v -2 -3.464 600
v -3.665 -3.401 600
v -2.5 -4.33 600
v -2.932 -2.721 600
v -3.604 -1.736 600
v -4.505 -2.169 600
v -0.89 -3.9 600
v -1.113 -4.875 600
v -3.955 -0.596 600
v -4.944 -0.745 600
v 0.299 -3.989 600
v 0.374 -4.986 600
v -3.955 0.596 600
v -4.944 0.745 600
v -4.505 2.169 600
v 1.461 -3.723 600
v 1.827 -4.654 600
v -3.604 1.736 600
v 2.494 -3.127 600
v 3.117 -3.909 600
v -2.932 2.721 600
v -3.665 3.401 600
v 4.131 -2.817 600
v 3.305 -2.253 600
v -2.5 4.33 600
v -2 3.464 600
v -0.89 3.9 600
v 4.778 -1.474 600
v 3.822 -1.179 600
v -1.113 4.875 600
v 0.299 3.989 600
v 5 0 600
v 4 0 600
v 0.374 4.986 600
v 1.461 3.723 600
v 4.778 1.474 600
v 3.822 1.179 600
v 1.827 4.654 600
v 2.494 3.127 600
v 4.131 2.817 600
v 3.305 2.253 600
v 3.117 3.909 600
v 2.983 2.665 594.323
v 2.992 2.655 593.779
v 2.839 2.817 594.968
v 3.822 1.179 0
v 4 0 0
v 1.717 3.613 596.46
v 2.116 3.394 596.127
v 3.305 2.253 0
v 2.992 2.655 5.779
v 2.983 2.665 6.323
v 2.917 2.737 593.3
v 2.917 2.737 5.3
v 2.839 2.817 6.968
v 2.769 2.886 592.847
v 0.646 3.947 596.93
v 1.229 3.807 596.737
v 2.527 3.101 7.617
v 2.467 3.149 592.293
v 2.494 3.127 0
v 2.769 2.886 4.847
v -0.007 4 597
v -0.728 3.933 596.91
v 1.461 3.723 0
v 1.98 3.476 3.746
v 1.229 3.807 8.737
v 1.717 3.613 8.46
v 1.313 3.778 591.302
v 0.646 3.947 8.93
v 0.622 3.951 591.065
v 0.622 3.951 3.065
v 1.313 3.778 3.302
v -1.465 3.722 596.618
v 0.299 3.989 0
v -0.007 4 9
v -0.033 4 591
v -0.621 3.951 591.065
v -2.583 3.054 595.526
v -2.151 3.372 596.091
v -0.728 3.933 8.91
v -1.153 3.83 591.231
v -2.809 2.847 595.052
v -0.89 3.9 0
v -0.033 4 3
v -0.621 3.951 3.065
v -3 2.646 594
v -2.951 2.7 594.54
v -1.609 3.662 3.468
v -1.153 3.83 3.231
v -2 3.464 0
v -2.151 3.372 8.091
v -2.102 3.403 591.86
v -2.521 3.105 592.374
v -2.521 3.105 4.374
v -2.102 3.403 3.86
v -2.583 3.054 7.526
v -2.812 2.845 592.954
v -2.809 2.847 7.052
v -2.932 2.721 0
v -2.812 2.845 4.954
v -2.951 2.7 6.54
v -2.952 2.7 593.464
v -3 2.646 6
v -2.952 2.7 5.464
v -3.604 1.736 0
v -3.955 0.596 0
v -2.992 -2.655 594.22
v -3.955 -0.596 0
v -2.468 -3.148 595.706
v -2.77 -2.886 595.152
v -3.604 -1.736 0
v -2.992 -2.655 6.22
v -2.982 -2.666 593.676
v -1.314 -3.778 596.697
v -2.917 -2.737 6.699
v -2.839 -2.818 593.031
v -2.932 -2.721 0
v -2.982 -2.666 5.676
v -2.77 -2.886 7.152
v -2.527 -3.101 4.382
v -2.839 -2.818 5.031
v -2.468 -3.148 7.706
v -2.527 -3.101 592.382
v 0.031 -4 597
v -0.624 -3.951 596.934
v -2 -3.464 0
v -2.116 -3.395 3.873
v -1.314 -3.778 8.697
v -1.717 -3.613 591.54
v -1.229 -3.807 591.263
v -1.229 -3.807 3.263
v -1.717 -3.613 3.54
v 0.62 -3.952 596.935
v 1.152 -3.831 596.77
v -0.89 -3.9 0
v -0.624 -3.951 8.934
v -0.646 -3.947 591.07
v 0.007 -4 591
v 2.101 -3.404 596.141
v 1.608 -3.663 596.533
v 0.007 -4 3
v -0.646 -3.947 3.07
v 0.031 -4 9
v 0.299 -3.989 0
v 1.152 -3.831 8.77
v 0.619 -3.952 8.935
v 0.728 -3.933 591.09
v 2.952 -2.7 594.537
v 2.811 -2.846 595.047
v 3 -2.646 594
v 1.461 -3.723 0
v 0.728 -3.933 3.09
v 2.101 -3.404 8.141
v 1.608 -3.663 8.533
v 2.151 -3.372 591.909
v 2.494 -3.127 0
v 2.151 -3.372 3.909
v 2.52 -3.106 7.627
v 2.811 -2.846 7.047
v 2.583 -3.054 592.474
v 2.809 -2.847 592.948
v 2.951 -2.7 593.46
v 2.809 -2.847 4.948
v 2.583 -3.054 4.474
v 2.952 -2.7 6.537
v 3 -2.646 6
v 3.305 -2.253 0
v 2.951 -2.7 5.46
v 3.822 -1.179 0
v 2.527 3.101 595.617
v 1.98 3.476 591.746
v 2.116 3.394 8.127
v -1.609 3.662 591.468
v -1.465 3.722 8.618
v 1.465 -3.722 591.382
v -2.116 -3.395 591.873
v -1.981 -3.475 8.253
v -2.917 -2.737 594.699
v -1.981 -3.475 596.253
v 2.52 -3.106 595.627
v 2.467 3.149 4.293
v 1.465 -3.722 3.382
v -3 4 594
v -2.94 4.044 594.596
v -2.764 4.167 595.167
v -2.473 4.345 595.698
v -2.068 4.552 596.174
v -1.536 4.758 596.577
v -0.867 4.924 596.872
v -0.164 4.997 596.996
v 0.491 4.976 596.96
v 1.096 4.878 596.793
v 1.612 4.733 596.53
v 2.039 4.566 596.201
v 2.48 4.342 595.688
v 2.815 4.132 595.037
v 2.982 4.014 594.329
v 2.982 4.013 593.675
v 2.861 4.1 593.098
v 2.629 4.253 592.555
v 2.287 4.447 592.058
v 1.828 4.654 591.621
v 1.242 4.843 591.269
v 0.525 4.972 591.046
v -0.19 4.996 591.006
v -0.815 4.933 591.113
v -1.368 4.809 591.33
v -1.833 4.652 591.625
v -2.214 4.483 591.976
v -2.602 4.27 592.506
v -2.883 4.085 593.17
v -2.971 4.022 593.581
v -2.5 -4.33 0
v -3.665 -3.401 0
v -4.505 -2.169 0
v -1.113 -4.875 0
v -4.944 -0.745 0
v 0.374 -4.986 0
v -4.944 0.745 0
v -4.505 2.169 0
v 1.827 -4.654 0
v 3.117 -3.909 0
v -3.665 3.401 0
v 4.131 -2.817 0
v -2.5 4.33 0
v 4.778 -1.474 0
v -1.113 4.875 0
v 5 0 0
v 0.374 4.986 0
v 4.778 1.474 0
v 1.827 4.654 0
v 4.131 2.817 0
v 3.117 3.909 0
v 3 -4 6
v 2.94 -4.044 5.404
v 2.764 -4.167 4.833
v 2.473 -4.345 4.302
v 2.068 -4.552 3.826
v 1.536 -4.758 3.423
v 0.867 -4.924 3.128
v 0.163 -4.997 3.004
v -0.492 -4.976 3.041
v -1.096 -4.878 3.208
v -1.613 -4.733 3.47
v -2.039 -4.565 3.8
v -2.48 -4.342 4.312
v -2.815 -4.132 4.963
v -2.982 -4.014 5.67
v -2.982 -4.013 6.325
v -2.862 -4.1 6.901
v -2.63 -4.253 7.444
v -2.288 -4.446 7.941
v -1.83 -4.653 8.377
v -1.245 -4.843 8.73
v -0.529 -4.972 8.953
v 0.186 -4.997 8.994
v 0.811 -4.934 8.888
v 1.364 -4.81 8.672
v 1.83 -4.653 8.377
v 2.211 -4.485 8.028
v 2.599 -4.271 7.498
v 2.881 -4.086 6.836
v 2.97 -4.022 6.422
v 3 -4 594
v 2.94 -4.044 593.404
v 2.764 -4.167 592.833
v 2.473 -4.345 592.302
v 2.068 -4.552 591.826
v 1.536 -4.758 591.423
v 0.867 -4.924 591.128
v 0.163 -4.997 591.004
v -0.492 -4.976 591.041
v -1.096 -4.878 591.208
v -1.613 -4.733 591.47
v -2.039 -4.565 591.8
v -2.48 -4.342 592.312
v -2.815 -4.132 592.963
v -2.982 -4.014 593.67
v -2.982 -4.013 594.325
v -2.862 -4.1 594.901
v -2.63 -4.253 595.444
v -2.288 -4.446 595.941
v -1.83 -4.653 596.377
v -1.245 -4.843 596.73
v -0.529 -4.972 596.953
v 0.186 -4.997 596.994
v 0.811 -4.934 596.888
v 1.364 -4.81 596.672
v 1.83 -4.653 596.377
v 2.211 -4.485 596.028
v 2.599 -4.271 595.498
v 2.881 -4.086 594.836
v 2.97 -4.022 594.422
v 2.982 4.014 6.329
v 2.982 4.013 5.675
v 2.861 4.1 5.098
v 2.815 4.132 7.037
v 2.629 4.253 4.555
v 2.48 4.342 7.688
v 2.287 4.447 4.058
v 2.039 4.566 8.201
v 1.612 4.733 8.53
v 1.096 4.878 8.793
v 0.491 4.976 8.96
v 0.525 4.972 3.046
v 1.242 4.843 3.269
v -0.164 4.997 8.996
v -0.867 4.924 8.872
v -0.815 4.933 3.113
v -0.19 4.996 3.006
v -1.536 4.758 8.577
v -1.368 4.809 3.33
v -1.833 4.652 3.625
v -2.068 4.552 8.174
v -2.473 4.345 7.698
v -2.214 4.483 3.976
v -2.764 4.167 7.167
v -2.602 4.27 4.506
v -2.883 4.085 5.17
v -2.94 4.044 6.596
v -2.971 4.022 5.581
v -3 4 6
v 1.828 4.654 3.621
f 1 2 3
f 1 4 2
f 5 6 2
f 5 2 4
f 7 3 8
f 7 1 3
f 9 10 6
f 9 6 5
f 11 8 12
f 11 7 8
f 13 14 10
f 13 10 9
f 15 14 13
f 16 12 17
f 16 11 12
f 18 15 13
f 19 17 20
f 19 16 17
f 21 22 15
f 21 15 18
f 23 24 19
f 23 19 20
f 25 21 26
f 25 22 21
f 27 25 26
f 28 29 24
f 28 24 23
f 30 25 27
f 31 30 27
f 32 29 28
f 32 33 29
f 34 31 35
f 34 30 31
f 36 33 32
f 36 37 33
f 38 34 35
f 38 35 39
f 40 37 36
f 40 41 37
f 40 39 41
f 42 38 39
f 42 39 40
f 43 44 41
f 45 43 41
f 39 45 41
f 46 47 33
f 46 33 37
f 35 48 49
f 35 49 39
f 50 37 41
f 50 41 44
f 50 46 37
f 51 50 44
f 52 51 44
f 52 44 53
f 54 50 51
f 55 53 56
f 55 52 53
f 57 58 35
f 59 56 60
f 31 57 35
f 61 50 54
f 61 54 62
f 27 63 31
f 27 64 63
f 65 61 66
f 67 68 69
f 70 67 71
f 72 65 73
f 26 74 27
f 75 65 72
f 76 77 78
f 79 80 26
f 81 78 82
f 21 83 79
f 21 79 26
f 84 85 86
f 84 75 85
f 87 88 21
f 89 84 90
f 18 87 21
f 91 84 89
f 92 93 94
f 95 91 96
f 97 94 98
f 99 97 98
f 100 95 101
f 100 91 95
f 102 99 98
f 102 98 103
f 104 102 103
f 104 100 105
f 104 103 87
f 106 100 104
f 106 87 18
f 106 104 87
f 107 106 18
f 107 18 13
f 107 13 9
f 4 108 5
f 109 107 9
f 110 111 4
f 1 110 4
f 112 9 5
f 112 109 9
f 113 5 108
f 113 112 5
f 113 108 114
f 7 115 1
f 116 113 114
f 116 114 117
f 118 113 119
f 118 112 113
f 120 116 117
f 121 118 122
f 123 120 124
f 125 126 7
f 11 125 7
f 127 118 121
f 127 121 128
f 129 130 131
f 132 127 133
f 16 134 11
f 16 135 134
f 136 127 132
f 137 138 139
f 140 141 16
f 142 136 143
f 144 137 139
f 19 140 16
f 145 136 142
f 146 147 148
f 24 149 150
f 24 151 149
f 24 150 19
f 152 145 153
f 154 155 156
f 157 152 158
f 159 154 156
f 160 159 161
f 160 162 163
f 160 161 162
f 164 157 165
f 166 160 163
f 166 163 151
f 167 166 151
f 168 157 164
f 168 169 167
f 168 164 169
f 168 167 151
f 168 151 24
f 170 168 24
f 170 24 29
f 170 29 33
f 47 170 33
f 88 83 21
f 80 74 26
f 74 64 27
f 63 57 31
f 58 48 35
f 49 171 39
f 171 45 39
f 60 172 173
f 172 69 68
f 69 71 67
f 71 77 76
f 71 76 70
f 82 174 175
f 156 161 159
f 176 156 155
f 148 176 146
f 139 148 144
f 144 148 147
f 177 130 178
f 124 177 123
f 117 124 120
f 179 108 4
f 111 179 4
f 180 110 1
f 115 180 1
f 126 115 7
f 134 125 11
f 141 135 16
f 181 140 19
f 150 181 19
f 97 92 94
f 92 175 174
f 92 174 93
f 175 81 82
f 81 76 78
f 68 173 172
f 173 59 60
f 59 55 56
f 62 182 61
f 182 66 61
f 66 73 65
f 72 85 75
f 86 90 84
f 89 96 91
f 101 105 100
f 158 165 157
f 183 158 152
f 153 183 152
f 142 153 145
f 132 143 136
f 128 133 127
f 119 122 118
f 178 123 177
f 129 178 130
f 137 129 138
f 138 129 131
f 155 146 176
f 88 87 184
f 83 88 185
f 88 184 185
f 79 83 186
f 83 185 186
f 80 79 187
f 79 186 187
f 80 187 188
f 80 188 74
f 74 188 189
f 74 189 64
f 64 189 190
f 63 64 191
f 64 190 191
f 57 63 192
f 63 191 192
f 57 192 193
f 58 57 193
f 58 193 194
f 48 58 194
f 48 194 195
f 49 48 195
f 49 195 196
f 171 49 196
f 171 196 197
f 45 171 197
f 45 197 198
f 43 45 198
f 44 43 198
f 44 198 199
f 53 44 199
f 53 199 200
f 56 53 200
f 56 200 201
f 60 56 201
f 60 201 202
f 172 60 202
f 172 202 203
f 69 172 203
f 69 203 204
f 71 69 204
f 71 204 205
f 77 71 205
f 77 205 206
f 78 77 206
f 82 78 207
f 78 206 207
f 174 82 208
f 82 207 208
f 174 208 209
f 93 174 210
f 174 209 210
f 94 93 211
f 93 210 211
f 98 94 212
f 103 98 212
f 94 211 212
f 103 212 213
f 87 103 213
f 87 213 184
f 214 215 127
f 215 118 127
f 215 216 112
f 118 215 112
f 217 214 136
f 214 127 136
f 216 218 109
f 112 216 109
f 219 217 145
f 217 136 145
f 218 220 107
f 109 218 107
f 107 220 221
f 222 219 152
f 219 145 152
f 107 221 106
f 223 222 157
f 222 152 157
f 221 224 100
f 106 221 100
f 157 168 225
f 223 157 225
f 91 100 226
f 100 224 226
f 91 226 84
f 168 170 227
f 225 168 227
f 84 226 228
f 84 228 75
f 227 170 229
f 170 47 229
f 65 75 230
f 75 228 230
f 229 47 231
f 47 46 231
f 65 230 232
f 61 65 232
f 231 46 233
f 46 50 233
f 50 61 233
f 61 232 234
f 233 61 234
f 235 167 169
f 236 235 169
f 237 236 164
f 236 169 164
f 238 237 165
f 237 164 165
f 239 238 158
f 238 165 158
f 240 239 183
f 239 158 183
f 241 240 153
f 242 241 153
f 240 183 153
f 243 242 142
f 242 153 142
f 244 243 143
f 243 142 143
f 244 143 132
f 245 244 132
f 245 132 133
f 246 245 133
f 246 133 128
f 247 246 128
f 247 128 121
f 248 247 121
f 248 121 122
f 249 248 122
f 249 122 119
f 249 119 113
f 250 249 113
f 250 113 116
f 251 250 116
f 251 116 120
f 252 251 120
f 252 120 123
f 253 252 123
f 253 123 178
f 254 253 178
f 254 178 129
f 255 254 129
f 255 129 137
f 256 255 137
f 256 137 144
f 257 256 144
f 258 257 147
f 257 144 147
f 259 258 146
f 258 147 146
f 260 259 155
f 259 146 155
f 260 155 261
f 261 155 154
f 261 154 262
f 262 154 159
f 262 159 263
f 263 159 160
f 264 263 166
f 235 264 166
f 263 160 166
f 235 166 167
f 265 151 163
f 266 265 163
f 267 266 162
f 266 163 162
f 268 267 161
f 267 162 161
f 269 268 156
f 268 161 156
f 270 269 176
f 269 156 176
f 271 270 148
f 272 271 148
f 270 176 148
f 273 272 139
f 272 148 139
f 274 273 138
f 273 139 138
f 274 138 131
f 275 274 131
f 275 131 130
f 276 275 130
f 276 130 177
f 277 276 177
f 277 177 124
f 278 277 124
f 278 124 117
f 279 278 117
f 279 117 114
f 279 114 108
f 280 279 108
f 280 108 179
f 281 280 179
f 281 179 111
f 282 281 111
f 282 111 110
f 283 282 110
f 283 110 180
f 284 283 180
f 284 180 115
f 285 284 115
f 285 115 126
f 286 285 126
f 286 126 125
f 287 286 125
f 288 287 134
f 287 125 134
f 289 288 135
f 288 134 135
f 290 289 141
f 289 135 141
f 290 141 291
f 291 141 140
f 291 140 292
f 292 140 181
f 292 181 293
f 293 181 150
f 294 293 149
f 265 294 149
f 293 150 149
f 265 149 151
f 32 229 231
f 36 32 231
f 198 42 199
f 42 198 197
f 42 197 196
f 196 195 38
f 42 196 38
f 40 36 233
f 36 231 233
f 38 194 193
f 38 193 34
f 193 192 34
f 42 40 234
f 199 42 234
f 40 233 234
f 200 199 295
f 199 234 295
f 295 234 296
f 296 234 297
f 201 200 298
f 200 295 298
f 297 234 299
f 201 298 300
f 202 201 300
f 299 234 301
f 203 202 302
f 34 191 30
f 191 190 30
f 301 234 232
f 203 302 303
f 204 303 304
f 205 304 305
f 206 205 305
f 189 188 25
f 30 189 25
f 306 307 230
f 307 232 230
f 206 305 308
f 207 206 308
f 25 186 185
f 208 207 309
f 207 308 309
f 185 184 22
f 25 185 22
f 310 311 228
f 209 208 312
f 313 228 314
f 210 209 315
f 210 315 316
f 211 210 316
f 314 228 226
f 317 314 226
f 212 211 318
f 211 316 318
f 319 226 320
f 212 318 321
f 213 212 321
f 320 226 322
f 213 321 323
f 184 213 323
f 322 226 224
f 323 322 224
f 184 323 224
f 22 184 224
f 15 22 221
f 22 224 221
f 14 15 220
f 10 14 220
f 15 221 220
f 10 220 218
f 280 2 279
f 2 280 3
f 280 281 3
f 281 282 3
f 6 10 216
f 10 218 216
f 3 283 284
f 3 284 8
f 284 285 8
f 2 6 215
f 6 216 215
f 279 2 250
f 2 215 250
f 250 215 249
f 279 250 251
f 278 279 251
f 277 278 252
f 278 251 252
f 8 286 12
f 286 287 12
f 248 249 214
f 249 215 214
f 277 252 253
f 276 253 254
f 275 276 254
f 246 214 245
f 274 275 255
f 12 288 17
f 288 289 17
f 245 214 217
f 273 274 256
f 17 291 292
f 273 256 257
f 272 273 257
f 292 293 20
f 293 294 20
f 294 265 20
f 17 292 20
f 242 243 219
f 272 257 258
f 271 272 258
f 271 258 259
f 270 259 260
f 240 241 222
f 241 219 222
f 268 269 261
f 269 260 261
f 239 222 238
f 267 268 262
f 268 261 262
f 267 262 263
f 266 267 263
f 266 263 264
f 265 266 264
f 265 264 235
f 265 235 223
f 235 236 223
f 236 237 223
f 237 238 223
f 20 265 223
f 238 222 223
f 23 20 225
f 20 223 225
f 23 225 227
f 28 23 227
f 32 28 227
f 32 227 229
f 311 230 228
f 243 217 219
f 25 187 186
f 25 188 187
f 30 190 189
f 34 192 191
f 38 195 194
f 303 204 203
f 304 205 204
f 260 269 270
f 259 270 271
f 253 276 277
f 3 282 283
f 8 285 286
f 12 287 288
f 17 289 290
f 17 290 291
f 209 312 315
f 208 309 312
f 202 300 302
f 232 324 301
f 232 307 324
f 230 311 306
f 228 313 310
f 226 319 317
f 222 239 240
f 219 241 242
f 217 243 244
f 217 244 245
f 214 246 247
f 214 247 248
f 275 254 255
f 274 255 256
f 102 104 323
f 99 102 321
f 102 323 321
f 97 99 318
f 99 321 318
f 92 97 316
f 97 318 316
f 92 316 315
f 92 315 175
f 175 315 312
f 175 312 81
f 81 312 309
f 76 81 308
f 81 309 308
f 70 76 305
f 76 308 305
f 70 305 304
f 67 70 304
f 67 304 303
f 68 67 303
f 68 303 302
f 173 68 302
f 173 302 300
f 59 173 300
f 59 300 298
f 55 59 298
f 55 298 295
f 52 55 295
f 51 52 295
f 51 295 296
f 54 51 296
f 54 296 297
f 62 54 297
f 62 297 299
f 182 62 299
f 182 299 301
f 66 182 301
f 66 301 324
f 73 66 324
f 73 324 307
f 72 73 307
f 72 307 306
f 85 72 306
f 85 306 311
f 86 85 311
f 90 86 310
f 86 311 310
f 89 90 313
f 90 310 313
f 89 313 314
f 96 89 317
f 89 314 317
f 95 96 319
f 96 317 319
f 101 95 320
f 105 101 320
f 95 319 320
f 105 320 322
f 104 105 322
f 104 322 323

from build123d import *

# Parameters (mm, degrees)
F0_R     = 5
F0_R_2   = 4
F1_DEPTH = 600
F3_D     = 6
F3_DEPTH = 5.001
F4_D     = 6


with BuildPart() as f1:
    # F0 (on Top) → F1 (new body)
    with BuildSketch(Plane.XY):
        Circle(F0_R)
        Circle(F0_R_2, mode=Mode.SUBTRACT)
    extrude(amount=F1_DEPTH)

    # F3 (through all, one way)
    with BuildSketch(Plane(origin=(0, 0, 0), x_dir=(1, 0, 0), z_dir=(0, 1, 0))):
        with Locations((0, -6), (0, -594)):
            Circle(F3_D / 2)
    extrude(amount=-F3_DEPTH, mode=Mode.SUBTRACT)

    # F4 (through all)
    with Locations(Plane.XZ):
        with Locations((0, 594), (0, 6)):
            Hole(F4_D / 2)


solid = f1.part
